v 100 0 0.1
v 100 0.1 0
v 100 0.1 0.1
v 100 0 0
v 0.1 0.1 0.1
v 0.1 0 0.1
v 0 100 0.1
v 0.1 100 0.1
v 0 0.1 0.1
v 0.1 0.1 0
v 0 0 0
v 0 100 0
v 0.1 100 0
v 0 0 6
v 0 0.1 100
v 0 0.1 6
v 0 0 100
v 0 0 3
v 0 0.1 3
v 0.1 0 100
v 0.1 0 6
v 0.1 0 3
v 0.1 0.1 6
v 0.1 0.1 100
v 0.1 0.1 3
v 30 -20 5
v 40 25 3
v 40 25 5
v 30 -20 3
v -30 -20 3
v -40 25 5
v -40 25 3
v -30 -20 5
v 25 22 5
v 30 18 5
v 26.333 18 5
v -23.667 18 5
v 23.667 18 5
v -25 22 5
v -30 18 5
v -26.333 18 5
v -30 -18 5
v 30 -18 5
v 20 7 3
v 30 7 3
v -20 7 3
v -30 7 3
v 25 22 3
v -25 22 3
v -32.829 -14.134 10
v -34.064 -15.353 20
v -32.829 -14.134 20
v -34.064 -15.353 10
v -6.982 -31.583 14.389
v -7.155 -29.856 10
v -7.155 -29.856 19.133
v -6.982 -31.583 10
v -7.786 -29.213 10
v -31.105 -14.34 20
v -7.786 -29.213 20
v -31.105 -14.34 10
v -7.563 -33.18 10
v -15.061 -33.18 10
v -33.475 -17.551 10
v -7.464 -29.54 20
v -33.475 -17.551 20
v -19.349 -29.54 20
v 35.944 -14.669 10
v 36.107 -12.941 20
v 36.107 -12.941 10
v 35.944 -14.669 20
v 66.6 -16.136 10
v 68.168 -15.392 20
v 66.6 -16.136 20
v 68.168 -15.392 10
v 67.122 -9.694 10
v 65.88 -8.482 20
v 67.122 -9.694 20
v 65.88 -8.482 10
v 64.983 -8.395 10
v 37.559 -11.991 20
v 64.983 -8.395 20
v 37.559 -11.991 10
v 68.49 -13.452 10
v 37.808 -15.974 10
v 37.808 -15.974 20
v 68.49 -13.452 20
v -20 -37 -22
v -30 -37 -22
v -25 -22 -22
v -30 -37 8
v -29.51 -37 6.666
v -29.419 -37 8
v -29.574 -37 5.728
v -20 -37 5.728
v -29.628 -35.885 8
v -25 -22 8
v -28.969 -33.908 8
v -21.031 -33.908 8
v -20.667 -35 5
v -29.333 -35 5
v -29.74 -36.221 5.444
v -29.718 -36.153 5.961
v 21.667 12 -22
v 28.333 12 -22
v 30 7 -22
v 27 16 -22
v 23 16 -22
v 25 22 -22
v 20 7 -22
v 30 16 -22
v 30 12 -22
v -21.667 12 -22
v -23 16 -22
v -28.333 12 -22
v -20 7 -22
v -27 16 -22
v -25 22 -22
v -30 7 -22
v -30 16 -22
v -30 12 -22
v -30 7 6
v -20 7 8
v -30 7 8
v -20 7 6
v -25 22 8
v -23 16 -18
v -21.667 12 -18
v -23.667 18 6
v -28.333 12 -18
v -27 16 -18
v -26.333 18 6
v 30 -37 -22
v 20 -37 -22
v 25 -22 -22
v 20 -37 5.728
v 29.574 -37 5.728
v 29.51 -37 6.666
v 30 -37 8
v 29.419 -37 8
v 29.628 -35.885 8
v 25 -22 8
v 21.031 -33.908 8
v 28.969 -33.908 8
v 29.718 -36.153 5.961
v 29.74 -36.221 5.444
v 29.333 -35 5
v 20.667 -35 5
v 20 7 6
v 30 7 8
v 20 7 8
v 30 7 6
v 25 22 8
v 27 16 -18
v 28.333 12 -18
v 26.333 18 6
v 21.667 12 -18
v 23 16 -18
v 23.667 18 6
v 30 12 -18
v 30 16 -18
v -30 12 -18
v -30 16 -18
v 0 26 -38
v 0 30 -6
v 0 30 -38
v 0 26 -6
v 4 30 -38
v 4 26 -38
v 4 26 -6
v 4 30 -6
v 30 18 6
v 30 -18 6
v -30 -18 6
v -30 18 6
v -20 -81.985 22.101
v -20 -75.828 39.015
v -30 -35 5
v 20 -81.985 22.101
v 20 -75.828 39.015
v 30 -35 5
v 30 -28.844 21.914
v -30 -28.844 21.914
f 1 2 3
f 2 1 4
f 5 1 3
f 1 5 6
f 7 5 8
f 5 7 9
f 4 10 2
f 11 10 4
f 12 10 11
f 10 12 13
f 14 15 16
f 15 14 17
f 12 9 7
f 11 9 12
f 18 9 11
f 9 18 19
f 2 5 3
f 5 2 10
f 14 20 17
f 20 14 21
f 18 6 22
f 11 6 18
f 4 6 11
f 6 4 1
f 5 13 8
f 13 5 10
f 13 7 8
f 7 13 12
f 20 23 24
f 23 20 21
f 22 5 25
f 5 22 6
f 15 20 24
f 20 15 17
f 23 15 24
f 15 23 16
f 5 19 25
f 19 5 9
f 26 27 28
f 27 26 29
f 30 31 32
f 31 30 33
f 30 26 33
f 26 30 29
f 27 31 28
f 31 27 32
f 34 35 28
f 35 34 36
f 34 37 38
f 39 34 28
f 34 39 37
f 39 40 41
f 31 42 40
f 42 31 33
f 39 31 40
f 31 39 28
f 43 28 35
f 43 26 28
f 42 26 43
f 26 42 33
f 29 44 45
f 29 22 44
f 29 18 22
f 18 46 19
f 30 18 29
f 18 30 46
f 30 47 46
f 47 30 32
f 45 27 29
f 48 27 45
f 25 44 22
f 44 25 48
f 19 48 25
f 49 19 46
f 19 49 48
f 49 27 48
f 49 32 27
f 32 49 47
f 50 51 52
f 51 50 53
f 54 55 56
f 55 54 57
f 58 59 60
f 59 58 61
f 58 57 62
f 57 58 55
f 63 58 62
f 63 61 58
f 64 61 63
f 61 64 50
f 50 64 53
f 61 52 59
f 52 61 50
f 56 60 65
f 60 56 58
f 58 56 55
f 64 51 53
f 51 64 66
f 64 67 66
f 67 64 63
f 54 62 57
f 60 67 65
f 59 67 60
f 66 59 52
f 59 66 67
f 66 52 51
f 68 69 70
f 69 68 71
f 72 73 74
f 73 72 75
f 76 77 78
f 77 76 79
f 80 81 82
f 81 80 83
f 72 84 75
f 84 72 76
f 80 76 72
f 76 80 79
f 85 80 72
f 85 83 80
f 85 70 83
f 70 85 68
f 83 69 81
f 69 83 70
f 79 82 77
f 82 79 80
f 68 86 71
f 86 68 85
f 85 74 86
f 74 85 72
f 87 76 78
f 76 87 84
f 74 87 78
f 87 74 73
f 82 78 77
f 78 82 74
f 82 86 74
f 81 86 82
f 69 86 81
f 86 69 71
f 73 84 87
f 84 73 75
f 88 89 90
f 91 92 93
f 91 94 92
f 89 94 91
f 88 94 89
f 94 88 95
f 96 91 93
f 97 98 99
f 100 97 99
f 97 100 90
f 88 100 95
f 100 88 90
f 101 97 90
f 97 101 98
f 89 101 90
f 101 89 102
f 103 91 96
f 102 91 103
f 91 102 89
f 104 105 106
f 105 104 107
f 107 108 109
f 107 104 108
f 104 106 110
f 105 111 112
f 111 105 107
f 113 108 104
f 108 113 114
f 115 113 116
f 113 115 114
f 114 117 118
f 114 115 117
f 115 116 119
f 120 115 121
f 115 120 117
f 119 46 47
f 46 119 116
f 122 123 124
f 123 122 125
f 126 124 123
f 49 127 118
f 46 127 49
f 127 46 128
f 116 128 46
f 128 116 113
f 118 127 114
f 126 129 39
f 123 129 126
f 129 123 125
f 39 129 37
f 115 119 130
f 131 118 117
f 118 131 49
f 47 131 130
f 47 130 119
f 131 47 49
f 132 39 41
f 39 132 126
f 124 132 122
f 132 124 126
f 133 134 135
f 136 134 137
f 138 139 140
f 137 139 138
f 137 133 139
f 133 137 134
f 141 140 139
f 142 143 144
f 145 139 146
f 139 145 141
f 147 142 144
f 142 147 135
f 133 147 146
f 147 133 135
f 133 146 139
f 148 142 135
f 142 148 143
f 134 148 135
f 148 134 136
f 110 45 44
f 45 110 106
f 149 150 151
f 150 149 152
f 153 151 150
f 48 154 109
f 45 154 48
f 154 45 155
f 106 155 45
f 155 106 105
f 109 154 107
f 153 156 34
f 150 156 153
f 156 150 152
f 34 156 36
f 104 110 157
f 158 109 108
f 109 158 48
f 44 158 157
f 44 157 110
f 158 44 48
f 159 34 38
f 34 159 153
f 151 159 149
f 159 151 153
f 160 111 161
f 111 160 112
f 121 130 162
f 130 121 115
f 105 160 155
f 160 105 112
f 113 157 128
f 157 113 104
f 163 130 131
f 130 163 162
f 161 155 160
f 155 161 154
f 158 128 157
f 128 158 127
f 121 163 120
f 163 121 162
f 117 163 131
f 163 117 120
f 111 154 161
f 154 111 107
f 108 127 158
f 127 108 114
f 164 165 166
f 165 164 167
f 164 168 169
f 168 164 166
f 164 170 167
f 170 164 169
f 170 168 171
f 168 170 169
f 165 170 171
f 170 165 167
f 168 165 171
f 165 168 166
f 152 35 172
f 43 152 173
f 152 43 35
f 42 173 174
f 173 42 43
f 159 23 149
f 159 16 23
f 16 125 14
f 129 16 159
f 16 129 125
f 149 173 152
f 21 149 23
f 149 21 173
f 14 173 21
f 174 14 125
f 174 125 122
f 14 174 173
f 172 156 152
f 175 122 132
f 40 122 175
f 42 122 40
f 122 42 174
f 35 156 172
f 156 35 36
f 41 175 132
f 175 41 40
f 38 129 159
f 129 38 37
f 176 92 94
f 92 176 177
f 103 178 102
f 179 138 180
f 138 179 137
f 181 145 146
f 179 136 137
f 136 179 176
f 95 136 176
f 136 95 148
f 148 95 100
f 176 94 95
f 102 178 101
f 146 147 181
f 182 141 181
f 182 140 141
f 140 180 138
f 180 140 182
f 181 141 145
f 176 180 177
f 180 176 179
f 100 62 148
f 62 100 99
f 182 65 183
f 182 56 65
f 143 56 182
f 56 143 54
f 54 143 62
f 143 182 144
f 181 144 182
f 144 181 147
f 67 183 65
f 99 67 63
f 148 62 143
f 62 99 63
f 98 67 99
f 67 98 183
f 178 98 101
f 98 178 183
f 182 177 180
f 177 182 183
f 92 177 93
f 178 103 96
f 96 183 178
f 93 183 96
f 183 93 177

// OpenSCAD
    // Combined Scene

    // Permanent Model
    
    // Permanent Model (Black)
    color([0, 0, 0]) {
        // Your permanent model code here
        cube([100,0.1,0.1], center = false);
        cube([0.1,100,0.1], center = false);
        cube([0.1,0.1,100], center = false);
    }
    

    // Dynamic Model
    translate([0, 0, 0]) {
    // Cushioned and Contoured Seat
    difference() {
        translate([0, 0, 0]) 
            linear_extrude(height=5) 
                polygon(points=[[-40, 25], [40, 25], [30, -20], [-30, -20]]);
        translate([0, 0, -1]) 
            cube([80, 50, 8], center=true);
    }

    // Ergonomic Backrest with Curves
    translate([0, -35, 5])
        rotate([-20, 0, 0])
        linear_extrude(height=18) 
            polygon(points=[[-30, 0], [30, 0], [20, -50], [-20, -50]]);
    
    // Stylized Armrests
    for (x = [-35, 35]) {
        translate([x, -15, 10]) {
            rotate([0, 0, x > 0 ? 20 : -20])
                linear_extrude(height=10) 
                    offset(r=2) 
                    polygon(points=[[3, 0], [30, -10], [30, -6], [3, 0]]);
        }
    }

    // Tapered and Splayed Legs
    for (i = [-1, 1]) {
        for (j = [-1, 1]) {
            translate([i * 25, j * 22, -22]) {
                rotate([0, 0, 0])
                    linear_extrude(height=30) 
                        polygon(points=[[0, 0], [-5, -15], [5, -15]]);
            }
        }
    }

    // Cross Support Structure
    translate([0, 0, -22]) {
        linear_extrude(height=4) 
            polygon(points=[[-30, 16], [30, 16], [30, 12], [-30, 12]]);
        rotate([0, 90, 0]) 
            linear_extrude(height=4) 
                polygon(points=[[-16, 30], [16, 30], [16, 26], [-16, 26]]);
    }

    // Seat Detail with Textural Indent
    translate([0, 0, 0]) {
        difference() {
            translate([0, 0, 2]) 
                linear_extrude(height=4) 
                    polygon(points=[[-30, 18], [30, 18], [30, -18], [-30, -18]]);
            translate([0, 0, -1]) 
                cube([60, 36, 10], center=true);
        }
    }
}
    
